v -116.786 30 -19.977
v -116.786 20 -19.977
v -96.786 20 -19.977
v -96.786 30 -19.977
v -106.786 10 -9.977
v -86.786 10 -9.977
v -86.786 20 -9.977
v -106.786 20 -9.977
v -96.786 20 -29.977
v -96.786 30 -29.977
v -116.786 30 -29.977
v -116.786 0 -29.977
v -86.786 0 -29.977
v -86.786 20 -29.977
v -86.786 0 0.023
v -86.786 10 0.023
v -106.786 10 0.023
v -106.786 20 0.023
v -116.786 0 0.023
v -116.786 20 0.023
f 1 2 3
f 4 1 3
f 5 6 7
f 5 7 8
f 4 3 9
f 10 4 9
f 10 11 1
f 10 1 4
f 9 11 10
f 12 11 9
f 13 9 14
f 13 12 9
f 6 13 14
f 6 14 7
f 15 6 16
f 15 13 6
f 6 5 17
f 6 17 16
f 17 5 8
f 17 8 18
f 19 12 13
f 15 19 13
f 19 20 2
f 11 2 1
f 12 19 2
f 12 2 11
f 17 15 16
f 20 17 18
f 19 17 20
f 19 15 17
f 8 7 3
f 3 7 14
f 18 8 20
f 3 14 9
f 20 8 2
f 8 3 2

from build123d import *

# Parameters (mm, degrees)
CROQUIS1_W              = 30
CROQUIS1_H              = 30
SALIENTE_EXTRUIR1_DEPTH = 10
SALIENTE_EXTRUIR2_DEPTH = 10
CROQUIS5_W              = 20
CROQUIS5_H              = 10
SALIENTE_EXTRUIR3_DEPTH = 10


with BuildPart() as part:
    # Croquis1 → Saliente-Extruir1 (new body)
    with BuildSketch(Plane(origin=(0, 0, 0), x_dir=(1, 0, 0), z_dir=(0, 1, 0))):
        with Locations((-101.786127258, 14.977187745)):
            Rectangle(CROQUIS1_W, CROQUIS1_H)
    extrude(amount=SALIENTE_EXTRUIR1_DEPTH)

    # Croquis3 → Saliente-Extruir2 (add)
    with BuildSketch(Plane(origin=(0, 10, 0), x_dir=(1, 0, 0), z_dir=(0, 1, 0))):
        Polygon((-116.786127258, 29.977187745), (-106.786127258, 29.977187745), (-86.786127258, 29.977187745), (-86.786127258, 9.977187745), (-106.786127258, 9.977187745), (-106.786127258, -0.022812255), (-116.786127258, -0.022812255), align=None)
    extrude(amount=SALIENTE_EXTRUIR2_DEPTH)

    # Croquis5 → Saliente-Extruir3 (add)
    with BuildSketch(Plane(origin=(0, 20, 0), x_dir=(1, 0, 0), z_dir=(0, 1, 0))):
        with Locations((-106.786127258, 24.977187745)):
            Rectangle(CROQUIS5_W, CROQUIS5_H)
    extrude(amount=SALIENTE_EXTRUIR3_DEPTH)


solid = part.part
